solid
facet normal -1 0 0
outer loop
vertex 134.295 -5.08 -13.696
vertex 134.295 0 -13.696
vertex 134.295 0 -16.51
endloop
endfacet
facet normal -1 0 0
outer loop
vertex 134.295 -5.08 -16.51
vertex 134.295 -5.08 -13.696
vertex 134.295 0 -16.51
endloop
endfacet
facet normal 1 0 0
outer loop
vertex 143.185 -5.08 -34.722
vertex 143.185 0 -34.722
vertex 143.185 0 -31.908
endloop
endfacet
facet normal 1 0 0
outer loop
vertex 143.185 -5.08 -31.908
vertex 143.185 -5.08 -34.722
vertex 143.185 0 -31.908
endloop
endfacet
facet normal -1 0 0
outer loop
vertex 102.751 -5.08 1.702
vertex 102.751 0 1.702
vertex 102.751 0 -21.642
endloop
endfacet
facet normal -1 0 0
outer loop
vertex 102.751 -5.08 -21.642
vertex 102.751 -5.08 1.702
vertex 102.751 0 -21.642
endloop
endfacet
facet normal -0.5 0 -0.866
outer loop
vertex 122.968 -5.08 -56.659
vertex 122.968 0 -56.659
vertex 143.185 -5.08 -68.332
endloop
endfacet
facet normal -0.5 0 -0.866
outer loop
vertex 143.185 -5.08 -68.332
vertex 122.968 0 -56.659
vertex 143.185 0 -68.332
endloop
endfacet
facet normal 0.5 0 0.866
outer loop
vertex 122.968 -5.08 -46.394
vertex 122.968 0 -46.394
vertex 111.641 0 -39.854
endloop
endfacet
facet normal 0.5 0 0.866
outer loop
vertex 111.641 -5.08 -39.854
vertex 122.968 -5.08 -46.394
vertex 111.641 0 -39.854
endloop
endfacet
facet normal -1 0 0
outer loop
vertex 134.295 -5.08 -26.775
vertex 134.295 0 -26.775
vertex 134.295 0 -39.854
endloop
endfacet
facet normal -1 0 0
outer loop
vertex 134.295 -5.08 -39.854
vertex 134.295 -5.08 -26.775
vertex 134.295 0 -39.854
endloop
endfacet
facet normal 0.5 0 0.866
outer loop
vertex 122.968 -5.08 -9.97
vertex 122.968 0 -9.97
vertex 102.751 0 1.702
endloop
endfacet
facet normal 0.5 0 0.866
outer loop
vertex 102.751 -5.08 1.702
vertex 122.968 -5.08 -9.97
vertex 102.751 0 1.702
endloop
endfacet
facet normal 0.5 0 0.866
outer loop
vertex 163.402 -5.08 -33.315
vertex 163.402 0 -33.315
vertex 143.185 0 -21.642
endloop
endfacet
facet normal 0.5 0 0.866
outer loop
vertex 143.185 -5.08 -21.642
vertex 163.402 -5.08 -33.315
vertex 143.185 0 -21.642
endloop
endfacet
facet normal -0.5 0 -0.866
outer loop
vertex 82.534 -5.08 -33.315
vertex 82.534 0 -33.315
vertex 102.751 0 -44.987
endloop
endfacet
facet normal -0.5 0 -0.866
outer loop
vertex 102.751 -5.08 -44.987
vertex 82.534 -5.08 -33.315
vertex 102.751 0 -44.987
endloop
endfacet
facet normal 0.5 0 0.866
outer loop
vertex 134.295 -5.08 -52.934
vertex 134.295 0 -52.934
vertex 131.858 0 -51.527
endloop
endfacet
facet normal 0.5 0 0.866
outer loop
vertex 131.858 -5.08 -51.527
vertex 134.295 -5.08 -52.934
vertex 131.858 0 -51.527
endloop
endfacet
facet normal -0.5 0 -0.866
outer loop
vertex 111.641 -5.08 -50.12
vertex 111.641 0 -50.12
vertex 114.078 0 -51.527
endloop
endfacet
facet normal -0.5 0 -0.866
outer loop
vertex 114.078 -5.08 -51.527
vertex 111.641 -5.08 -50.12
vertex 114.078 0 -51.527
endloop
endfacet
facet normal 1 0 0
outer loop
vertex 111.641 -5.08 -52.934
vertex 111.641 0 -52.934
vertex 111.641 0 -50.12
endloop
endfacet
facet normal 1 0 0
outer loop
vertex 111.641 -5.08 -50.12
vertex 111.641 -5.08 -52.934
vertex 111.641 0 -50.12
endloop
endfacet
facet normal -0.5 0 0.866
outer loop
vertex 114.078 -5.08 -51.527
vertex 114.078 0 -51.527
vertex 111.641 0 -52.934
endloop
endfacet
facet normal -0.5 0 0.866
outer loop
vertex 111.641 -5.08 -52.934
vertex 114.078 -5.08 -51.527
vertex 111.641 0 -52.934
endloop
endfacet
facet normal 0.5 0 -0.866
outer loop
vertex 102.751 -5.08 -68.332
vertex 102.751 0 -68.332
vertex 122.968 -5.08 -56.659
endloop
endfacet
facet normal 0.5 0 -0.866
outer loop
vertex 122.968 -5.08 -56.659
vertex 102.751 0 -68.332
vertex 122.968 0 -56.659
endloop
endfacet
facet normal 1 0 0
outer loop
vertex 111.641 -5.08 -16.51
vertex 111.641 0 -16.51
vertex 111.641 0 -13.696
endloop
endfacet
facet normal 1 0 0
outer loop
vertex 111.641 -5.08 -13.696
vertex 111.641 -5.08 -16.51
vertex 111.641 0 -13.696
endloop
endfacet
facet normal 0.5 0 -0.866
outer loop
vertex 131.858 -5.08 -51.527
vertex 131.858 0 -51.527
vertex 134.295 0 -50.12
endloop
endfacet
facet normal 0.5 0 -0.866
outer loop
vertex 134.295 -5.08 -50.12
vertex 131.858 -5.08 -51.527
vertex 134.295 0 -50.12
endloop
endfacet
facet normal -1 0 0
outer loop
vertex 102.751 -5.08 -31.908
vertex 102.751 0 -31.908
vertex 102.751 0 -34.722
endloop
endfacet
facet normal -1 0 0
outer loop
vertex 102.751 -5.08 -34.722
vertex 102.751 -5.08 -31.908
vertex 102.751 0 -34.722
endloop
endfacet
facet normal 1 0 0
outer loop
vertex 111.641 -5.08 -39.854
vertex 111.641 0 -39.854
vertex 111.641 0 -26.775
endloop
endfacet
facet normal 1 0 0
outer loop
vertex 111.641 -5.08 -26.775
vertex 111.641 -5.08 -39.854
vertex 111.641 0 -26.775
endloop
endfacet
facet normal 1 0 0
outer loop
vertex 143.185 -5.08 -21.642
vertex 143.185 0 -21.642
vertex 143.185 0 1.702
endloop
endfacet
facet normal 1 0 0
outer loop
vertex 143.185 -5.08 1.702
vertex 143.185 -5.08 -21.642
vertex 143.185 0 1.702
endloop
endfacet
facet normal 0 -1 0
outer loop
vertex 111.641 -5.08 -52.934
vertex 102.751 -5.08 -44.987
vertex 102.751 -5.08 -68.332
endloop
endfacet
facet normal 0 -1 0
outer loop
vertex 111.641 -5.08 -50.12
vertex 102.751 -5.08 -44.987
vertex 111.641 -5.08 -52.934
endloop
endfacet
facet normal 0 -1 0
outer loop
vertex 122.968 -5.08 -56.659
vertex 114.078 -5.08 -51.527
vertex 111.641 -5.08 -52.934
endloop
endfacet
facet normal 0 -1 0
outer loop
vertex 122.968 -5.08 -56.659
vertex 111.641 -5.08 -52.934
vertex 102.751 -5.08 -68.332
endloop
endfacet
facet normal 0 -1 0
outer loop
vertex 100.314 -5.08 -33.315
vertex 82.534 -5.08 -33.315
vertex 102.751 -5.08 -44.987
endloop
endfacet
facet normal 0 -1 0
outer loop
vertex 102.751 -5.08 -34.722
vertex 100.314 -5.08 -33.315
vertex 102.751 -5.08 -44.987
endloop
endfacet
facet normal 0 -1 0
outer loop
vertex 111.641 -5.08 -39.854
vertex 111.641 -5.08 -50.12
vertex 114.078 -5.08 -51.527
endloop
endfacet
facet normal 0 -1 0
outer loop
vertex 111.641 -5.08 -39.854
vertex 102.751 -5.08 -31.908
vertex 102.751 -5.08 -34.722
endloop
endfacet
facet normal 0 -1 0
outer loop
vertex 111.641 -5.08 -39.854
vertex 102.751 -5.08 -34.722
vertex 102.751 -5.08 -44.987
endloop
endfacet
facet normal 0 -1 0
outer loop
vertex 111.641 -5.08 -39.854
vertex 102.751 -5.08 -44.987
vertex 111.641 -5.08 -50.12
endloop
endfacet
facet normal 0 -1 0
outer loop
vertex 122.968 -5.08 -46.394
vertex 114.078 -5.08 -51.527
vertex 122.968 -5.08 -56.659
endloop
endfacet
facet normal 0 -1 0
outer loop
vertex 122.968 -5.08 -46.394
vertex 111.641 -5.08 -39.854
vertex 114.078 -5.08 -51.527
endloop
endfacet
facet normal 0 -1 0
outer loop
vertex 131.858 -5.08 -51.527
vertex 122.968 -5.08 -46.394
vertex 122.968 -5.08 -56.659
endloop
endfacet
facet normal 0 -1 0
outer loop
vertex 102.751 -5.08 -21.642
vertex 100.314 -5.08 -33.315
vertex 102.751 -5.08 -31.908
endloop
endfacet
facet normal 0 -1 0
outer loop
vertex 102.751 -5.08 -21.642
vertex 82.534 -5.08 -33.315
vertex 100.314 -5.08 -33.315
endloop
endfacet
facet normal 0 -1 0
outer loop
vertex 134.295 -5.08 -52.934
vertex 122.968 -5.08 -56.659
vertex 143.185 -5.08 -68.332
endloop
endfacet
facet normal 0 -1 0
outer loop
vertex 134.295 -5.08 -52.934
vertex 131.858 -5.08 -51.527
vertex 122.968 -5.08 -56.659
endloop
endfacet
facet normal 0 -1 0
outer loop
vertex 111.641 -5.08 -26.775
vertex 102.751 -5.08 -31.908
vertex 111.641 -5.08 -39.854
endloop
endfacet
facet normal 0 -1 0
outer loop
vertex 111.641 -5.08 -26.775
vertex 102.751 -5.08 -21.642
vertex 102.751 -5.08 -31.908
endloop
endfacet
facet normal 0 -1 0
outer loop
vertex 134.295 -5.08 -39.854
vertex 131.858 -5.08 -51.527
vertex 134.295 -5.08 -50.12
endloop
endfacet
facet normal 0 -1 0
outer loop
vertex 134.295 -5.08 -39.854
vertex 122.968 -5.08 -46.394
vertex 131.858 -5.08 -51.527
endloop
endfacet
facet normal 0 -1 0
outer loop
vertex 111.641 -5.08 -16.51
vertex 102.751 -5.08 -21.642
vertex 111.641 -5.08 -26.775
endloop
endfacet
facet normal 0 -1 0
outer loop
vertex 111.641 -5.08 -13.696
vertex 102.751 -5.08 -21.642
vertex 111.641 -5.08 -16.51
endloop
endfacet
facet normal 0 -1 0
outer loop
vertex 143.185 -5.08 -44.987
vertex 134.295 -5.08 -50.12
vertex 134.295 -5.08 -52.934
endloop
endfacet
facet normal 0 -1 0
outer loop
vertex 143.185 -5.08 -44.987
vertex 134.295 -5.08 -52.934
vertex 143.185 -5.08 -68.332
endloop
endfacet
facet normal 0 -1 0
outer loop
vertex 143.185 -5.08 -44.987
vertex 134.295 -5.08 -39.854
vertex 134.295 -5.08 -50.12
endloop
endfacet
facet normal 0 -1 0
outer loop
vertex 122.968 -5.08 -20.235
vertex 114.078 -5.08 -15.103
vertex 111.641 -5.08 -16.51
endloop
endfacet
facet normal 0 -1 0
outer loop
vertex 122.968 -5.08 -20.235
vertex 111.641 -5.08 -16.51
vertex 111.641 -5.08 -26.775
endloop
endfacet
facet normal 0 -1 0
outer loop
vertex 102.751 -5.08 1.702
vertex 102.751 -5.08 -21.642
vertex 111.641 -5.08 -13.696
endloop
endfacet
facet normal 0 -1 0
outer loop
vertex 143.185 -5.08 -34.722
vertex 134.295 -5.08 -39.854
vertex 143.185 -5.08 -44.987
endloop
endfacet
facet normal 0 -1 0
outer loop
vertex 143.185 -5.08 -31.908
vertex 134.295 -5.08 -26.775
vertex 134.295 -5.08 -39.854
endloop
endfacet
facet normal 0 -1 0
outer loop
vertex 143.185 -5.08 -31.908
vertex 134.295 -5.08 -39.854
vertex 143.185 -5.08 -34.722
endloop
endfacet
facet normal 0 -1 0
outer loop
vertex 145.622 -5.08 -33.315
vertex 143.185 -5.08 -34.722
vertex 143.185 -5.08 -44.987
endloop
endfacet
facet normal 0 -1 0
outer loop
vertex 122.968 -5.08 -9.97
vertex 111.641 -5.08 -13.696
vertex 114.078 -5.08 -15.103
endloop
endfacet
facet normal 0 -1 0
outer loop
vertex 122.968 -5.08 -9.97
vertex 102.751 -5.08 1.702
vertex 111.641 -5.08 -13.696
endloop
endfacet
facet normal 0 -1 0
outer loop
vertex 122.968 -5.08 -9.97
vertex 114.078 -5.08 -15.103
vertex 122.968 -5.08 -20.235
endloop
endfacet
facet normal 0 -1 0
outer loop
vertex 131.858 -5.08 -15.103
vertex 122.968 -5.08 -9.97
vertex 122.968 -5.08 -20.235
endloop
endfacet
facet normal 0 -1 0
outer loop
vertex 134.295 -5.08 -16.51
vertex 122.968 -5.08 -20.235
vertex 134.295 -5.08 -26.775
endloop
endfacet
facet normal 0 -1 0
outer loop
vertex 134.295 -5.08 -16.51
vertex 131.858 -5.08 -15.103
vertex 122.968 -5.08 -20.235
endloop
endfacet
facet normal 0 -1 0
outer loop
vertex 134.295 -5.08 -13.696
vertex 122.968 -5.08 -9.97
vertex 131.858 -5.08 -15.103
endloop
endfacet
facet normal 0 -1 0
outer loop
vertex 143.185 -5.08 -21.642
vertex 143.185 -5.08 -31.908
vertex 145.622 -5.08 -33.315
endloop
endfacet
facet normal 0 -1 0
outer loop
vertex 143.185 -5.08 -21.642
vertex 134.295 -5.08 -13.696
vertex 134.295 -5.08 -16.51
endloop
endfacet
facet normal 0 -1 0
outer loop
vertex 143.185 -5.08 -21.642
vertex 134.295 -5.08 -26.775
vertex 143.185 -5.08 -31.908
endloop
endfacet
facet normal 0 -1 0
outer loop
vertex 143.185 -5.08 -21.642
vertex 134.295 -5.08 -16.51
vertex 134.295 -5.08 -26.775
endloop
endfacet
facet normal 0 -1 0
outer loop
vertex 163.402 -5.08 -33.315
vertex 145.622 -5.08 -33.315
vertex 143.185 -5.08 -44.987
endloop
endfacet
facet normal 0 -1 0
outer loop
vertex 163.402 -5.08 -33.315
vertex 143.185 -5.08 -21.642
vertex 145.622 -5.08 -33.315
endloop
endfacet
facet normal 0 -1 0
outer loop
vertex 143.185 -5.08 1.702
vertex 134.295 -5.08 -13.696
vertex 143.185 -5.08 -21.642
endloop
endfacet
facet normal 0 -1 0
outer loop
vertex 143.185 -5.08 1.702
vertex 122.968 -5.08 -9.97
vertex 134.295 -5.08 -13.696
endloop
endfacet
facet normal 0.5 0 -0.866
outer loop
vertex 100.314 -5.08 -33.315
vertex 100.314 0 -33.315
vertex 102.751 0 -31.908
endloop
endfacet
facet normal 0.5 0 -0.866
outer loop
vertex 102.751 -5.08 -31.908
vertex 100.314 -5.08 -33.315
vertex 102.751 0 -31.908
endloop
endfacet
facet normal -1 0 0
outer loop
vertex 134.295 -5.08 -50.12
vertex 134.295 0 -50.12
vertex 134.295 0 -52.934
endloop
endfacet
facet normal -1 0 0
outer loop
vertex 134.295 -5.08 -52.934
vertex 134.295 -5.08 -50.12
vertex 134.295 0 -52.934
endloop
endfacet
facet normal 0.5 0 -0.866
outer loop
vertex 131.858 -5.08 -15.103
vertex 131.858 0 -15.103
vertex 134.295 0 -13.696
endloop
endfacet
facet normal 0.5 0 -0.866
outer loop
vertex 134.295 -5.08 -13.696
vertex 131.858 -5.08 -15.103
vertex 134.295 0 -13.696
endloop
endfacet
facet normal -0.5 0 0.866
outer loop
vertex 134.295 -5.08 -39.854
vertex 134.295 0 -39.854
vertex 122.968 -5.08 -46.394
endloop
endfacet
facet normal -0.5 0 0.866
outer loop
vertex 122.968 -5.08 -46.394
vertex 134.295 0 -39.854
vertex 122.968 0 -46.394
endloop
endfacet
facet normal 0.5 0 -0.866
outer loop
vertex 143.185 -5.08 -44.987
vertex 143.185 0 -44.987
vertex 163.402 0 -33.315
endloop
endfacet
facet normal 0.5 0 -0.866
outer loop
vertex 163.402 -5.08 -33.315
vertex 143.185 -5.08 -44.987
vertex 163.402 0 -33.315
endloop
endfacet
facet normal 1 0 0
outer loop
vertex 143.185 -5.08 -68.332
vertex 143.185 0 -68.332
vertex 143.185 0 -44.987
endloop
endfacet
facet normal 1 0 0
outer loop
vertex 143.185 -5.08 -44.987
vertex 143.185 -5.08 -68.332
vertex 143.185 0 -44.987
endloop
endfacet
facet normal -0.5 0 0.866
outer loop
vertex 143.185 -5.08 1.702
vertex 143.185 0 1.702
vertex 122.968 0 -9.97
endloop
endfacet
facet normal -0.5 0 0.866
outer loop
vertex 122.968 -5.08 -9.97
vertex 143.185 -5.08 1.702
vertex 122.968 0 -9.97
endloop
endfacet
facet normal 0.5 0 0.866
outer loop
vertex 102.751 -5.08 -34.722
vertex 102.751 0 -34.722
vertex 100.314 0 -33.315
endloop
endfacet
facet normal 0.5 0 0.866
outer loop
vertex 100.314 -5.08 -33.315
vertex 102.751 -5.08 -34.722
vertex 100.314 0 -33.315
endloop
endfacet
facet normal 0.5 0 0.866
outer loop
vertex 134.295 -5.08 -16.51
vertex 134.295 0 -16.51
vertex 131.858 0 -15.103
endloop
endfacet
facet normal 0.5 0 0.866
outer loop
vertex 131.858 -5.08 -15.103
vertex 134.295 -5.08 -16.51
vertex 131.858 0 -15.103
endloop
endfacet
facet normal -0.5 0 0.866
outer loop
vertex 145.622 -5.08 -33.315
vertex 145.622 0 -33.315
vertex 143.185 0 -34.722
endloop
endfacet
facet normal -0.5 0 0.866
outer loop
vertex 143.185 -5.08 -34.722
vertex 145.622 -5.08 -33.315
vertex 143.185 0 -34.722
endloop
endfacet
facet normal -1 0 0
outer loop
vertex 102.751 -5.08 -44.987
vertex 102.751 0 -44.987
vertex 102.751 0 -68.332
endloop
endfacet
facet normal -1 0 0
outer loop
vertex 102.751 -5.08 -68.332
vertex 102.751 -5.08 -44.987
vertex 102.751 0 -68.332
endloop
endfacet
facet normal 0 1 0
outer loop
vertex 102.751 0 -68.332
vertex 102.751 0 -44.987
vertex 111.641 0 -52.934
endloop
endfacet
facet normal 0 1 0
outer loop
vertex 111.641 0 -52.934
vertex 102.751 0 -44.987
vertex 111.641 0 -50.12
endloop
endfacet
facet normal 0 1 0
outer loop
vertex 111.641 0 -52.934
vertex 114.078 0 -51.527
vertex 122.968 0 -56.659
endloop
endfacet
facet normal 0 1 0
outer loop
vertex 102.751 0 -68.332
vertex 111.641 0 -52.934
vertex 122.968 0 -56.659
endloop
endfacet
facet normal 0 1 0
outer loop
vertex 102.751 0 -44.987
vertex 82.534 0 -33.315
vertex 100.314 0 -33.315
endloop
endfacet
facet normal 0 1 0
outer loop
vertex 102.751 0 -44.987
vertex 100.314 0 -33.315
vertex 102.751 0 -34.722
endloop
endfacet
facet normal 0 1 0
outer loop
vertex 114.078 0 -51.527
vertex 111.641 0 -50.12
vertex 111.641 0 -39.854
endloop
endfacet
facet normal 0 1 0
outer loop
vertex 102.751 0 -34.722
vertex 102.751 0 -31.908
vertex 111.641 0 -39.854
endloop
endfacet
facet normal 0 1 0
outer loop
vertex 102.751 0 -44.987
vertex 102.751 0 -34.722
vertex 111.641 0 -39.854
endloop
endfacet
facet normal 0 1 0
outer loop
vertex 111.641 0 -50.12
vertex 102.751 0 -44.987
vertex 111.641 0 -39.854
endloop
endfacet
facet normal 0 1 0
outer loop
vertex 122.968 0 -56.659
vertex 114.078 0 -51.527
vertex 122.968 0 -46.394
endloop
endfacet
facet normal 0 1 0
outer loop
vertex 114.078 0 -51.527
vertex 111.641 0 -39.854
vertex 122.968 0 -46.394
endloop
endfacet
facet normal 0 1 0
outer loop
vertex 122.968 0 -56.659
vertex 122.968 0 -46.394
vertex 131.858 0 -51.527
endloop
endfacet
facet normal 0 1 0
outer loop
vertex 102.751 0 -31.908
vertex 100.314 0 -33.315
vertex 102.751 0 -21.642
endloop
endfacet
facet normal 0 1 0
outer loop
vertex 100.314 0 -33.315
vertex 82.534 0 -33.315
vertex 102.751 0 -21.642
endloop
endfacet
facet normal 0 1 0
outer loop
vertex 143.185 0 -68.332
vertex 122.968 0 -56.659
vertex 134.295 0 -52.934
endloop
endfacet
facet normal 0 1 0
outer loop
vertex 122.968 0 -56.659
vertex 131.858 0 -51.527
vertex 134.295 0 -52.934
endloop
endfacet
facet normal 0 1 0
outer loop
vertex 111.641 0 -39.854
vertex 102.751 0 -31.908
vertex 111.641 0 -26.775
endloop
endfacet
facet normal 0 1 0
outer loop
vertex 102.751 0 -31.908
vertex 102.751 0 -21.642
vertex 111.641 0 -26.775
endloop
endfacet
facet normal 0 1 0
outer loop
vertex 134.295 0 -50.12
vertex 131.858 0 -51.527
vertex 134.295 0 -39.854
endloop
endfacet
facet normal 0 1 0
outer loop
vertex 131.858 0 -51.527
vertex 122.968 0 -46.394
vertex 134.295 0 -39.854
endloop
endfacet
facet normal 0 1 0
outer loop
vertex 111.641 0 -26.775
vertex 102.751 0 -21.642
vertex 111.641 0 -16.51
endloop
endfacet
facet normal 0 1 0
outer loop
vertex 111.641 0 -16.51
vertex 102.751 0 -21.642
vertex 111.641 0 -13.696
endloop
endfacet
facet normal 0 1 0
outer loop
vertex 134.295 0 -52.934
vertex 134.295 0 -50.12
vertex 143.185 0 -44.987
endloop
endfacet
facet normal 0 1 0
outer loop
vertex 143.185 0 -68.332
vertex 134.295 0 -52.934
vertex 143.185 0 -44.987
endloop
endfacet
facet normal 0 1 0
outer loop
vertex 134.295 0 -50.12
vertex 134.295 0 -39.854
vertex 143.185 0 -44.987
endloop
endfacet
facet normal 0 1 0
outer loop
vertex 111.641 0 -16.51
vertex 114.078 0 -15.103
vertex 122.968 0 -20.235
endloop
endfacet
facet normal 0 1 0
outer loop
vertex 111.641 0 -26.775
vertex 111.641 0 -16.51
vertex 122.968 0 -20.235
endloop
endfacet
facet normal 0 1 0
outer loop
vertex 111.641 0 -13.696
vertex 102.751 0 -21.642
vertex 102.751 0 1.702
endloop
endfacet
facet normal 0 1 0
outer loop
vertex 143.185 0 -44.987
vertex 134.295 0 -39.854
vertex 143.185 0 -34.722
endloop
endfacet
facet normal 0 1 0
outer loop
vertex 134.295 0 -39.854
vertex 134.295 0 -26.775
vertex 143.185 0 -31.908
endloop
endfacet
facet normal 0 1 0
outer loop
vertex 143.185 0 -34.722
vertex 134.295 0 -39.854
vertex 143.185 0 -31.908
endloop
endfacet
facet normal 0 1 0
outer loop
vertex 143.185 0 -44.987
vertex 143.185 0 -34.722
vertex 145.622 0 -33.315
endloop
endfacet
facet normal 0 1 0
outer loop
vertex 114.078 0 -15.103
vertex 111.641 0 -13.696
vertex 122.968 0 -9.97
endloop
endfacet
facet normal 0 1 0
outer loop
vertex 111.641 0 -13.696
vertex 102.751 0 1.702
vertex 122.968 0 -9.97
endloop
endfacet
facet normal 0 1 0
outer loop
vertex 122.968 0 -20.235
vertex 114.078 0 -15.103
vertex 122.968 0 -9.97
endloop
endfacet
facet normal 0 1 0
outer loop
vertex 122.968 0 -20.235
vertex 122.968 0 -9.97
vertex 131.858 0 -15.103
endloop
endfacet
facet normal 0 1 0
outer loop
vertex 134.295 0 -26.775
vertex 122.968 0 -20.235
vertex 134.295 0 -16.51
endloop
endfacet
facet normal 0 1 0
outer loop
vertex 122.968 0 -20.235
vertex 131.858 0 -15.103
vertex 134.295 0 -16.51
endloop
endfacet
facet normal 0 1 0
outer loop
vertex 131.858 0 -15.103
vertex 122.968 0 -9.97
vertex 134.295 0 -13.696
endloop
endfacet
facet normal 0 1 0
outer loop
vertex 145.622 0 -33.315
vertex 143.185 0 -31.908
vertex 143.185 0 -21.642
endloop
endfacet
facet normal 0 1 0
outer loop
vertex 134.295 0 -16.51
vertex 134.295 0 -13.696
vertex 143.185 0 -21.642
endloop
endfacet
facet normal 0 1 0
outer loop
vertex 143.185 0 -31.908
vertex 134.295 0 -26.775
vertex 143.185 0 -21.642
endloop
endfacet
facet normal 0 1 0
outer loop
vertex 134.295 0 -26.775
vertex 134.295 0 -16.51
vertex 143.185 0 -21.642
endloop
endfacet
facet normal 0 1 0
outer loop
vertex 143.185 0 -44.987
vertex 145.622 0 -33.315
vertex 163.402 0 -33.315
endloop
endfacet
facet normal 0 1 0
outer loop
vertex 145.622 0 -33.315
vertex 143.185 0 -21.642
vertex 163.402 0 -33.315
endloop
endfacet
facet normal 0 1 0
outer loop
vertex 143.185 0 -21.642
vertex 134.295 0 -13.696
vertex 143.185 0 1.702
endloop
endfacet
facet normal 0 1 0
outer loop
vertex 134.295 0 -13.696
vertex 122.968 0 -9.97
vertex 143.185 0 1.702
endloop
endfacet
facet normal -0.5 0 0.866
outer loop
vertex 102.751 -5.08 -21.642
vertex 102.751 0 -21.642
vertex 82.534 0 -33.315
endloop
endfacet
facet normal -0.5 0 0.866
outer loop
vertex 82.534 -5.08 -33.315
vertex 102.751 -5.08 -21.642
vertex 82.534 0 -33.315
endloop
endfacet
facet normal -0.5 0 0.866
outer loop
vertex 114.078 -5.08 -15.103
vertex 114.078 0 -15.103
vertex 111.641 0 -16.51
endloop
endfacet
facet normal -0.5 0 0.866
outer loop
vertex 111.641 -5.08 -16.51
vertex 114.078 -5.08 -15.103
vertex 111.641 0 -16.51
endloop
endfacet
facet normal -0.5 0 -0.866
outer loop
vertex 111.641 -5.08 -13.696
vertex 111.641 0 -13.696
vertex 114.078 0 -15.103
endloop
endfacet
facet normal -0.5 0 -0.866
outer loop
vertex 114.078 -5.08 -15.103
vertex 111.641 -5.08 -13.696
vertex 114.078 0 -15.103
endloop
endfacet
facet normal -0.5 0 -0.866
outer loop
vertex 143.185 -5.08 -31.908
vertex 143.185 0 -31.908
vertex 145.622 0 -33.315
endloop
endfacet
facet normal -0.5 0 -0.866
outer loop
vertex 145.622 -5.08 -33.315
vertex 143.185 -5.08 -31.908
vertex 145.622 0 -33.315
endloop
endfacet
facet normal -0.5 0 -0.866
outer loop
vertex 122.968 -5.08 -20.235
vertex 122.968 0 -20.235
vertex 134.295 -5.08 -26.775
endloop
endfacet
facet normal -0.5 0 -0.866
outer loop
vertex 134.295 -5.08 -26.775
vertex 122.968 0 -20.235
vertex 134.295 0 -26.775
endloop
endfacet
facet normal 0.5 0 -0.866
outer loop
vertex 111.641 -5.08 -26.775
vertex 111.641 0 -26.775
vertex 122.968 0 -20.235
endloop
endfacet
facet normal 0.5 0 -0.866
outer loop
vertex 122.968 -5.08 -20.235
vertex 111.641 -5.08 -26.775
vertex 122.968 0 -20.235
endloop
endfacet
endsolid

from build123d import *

# Parameters (mm, degrees)
F1_DEPTH = 5.08


with BuildPart() as f1:
    # F0 (on Front) → F1 (new body)
    with BuildSketch(Plane.XZ):
        Polygon((143.185273, -21.642312), (143.185273, 1.702374), (122.968182, -9.969969), (102.751091, 1.702374), (102.751091, -21.642312), (82.534, -33.314655), (102.751091, -44.986997), (102.751091, -68.331683), (122.968182, -56.65934), (143.185273, -68.331683), (143.185273, -44.986997), (163.402364, -33.314655), align=None)
        Polygon((111.641093, -50.119643), (114.07818, -51.526695), (111.641093, -52.933748), align=None, mode=Mode.SUBTRACT)
        Polygon((134.295271, -52.933748), (131.858184, -51.526695), (134.295271, -50.119643), align=None, mode=Mode.SUBTRACT)
        Polygon((102.751091, -31.907602), (102.751091, -34.721707), (100.314004, -33.314655), align=None, mode=Mode.SUBTRACT)
        Polygon((122.968182, -46.39405), (111.641093, -39.854352), (111.641093, -26.774957), (122.968182, -20.235259), (134.295271, -26.774957), (134.295271, -39.854352), align=None, mode=Mode.SUBTRACT)
        Polygon((114.07818, -15.102614), (111.641093, -16.509667), (111.641093, -13.695561), align=None, mode=Mode.SUBTRACT)
        Polygon((143.185273, -34.721707), (143.185273, -31.907602), (145.62236, -33.314655), align=None, mode=Mode.SUBTRACT)
        Polygon((134.295271, -16.509667), (131.858184, -15.102614), (134.295271, -13.695561), align=None, mode=Mode.SUBTRACT)
    extrude(amount=F1_DEPTH)


solid = f1.part
